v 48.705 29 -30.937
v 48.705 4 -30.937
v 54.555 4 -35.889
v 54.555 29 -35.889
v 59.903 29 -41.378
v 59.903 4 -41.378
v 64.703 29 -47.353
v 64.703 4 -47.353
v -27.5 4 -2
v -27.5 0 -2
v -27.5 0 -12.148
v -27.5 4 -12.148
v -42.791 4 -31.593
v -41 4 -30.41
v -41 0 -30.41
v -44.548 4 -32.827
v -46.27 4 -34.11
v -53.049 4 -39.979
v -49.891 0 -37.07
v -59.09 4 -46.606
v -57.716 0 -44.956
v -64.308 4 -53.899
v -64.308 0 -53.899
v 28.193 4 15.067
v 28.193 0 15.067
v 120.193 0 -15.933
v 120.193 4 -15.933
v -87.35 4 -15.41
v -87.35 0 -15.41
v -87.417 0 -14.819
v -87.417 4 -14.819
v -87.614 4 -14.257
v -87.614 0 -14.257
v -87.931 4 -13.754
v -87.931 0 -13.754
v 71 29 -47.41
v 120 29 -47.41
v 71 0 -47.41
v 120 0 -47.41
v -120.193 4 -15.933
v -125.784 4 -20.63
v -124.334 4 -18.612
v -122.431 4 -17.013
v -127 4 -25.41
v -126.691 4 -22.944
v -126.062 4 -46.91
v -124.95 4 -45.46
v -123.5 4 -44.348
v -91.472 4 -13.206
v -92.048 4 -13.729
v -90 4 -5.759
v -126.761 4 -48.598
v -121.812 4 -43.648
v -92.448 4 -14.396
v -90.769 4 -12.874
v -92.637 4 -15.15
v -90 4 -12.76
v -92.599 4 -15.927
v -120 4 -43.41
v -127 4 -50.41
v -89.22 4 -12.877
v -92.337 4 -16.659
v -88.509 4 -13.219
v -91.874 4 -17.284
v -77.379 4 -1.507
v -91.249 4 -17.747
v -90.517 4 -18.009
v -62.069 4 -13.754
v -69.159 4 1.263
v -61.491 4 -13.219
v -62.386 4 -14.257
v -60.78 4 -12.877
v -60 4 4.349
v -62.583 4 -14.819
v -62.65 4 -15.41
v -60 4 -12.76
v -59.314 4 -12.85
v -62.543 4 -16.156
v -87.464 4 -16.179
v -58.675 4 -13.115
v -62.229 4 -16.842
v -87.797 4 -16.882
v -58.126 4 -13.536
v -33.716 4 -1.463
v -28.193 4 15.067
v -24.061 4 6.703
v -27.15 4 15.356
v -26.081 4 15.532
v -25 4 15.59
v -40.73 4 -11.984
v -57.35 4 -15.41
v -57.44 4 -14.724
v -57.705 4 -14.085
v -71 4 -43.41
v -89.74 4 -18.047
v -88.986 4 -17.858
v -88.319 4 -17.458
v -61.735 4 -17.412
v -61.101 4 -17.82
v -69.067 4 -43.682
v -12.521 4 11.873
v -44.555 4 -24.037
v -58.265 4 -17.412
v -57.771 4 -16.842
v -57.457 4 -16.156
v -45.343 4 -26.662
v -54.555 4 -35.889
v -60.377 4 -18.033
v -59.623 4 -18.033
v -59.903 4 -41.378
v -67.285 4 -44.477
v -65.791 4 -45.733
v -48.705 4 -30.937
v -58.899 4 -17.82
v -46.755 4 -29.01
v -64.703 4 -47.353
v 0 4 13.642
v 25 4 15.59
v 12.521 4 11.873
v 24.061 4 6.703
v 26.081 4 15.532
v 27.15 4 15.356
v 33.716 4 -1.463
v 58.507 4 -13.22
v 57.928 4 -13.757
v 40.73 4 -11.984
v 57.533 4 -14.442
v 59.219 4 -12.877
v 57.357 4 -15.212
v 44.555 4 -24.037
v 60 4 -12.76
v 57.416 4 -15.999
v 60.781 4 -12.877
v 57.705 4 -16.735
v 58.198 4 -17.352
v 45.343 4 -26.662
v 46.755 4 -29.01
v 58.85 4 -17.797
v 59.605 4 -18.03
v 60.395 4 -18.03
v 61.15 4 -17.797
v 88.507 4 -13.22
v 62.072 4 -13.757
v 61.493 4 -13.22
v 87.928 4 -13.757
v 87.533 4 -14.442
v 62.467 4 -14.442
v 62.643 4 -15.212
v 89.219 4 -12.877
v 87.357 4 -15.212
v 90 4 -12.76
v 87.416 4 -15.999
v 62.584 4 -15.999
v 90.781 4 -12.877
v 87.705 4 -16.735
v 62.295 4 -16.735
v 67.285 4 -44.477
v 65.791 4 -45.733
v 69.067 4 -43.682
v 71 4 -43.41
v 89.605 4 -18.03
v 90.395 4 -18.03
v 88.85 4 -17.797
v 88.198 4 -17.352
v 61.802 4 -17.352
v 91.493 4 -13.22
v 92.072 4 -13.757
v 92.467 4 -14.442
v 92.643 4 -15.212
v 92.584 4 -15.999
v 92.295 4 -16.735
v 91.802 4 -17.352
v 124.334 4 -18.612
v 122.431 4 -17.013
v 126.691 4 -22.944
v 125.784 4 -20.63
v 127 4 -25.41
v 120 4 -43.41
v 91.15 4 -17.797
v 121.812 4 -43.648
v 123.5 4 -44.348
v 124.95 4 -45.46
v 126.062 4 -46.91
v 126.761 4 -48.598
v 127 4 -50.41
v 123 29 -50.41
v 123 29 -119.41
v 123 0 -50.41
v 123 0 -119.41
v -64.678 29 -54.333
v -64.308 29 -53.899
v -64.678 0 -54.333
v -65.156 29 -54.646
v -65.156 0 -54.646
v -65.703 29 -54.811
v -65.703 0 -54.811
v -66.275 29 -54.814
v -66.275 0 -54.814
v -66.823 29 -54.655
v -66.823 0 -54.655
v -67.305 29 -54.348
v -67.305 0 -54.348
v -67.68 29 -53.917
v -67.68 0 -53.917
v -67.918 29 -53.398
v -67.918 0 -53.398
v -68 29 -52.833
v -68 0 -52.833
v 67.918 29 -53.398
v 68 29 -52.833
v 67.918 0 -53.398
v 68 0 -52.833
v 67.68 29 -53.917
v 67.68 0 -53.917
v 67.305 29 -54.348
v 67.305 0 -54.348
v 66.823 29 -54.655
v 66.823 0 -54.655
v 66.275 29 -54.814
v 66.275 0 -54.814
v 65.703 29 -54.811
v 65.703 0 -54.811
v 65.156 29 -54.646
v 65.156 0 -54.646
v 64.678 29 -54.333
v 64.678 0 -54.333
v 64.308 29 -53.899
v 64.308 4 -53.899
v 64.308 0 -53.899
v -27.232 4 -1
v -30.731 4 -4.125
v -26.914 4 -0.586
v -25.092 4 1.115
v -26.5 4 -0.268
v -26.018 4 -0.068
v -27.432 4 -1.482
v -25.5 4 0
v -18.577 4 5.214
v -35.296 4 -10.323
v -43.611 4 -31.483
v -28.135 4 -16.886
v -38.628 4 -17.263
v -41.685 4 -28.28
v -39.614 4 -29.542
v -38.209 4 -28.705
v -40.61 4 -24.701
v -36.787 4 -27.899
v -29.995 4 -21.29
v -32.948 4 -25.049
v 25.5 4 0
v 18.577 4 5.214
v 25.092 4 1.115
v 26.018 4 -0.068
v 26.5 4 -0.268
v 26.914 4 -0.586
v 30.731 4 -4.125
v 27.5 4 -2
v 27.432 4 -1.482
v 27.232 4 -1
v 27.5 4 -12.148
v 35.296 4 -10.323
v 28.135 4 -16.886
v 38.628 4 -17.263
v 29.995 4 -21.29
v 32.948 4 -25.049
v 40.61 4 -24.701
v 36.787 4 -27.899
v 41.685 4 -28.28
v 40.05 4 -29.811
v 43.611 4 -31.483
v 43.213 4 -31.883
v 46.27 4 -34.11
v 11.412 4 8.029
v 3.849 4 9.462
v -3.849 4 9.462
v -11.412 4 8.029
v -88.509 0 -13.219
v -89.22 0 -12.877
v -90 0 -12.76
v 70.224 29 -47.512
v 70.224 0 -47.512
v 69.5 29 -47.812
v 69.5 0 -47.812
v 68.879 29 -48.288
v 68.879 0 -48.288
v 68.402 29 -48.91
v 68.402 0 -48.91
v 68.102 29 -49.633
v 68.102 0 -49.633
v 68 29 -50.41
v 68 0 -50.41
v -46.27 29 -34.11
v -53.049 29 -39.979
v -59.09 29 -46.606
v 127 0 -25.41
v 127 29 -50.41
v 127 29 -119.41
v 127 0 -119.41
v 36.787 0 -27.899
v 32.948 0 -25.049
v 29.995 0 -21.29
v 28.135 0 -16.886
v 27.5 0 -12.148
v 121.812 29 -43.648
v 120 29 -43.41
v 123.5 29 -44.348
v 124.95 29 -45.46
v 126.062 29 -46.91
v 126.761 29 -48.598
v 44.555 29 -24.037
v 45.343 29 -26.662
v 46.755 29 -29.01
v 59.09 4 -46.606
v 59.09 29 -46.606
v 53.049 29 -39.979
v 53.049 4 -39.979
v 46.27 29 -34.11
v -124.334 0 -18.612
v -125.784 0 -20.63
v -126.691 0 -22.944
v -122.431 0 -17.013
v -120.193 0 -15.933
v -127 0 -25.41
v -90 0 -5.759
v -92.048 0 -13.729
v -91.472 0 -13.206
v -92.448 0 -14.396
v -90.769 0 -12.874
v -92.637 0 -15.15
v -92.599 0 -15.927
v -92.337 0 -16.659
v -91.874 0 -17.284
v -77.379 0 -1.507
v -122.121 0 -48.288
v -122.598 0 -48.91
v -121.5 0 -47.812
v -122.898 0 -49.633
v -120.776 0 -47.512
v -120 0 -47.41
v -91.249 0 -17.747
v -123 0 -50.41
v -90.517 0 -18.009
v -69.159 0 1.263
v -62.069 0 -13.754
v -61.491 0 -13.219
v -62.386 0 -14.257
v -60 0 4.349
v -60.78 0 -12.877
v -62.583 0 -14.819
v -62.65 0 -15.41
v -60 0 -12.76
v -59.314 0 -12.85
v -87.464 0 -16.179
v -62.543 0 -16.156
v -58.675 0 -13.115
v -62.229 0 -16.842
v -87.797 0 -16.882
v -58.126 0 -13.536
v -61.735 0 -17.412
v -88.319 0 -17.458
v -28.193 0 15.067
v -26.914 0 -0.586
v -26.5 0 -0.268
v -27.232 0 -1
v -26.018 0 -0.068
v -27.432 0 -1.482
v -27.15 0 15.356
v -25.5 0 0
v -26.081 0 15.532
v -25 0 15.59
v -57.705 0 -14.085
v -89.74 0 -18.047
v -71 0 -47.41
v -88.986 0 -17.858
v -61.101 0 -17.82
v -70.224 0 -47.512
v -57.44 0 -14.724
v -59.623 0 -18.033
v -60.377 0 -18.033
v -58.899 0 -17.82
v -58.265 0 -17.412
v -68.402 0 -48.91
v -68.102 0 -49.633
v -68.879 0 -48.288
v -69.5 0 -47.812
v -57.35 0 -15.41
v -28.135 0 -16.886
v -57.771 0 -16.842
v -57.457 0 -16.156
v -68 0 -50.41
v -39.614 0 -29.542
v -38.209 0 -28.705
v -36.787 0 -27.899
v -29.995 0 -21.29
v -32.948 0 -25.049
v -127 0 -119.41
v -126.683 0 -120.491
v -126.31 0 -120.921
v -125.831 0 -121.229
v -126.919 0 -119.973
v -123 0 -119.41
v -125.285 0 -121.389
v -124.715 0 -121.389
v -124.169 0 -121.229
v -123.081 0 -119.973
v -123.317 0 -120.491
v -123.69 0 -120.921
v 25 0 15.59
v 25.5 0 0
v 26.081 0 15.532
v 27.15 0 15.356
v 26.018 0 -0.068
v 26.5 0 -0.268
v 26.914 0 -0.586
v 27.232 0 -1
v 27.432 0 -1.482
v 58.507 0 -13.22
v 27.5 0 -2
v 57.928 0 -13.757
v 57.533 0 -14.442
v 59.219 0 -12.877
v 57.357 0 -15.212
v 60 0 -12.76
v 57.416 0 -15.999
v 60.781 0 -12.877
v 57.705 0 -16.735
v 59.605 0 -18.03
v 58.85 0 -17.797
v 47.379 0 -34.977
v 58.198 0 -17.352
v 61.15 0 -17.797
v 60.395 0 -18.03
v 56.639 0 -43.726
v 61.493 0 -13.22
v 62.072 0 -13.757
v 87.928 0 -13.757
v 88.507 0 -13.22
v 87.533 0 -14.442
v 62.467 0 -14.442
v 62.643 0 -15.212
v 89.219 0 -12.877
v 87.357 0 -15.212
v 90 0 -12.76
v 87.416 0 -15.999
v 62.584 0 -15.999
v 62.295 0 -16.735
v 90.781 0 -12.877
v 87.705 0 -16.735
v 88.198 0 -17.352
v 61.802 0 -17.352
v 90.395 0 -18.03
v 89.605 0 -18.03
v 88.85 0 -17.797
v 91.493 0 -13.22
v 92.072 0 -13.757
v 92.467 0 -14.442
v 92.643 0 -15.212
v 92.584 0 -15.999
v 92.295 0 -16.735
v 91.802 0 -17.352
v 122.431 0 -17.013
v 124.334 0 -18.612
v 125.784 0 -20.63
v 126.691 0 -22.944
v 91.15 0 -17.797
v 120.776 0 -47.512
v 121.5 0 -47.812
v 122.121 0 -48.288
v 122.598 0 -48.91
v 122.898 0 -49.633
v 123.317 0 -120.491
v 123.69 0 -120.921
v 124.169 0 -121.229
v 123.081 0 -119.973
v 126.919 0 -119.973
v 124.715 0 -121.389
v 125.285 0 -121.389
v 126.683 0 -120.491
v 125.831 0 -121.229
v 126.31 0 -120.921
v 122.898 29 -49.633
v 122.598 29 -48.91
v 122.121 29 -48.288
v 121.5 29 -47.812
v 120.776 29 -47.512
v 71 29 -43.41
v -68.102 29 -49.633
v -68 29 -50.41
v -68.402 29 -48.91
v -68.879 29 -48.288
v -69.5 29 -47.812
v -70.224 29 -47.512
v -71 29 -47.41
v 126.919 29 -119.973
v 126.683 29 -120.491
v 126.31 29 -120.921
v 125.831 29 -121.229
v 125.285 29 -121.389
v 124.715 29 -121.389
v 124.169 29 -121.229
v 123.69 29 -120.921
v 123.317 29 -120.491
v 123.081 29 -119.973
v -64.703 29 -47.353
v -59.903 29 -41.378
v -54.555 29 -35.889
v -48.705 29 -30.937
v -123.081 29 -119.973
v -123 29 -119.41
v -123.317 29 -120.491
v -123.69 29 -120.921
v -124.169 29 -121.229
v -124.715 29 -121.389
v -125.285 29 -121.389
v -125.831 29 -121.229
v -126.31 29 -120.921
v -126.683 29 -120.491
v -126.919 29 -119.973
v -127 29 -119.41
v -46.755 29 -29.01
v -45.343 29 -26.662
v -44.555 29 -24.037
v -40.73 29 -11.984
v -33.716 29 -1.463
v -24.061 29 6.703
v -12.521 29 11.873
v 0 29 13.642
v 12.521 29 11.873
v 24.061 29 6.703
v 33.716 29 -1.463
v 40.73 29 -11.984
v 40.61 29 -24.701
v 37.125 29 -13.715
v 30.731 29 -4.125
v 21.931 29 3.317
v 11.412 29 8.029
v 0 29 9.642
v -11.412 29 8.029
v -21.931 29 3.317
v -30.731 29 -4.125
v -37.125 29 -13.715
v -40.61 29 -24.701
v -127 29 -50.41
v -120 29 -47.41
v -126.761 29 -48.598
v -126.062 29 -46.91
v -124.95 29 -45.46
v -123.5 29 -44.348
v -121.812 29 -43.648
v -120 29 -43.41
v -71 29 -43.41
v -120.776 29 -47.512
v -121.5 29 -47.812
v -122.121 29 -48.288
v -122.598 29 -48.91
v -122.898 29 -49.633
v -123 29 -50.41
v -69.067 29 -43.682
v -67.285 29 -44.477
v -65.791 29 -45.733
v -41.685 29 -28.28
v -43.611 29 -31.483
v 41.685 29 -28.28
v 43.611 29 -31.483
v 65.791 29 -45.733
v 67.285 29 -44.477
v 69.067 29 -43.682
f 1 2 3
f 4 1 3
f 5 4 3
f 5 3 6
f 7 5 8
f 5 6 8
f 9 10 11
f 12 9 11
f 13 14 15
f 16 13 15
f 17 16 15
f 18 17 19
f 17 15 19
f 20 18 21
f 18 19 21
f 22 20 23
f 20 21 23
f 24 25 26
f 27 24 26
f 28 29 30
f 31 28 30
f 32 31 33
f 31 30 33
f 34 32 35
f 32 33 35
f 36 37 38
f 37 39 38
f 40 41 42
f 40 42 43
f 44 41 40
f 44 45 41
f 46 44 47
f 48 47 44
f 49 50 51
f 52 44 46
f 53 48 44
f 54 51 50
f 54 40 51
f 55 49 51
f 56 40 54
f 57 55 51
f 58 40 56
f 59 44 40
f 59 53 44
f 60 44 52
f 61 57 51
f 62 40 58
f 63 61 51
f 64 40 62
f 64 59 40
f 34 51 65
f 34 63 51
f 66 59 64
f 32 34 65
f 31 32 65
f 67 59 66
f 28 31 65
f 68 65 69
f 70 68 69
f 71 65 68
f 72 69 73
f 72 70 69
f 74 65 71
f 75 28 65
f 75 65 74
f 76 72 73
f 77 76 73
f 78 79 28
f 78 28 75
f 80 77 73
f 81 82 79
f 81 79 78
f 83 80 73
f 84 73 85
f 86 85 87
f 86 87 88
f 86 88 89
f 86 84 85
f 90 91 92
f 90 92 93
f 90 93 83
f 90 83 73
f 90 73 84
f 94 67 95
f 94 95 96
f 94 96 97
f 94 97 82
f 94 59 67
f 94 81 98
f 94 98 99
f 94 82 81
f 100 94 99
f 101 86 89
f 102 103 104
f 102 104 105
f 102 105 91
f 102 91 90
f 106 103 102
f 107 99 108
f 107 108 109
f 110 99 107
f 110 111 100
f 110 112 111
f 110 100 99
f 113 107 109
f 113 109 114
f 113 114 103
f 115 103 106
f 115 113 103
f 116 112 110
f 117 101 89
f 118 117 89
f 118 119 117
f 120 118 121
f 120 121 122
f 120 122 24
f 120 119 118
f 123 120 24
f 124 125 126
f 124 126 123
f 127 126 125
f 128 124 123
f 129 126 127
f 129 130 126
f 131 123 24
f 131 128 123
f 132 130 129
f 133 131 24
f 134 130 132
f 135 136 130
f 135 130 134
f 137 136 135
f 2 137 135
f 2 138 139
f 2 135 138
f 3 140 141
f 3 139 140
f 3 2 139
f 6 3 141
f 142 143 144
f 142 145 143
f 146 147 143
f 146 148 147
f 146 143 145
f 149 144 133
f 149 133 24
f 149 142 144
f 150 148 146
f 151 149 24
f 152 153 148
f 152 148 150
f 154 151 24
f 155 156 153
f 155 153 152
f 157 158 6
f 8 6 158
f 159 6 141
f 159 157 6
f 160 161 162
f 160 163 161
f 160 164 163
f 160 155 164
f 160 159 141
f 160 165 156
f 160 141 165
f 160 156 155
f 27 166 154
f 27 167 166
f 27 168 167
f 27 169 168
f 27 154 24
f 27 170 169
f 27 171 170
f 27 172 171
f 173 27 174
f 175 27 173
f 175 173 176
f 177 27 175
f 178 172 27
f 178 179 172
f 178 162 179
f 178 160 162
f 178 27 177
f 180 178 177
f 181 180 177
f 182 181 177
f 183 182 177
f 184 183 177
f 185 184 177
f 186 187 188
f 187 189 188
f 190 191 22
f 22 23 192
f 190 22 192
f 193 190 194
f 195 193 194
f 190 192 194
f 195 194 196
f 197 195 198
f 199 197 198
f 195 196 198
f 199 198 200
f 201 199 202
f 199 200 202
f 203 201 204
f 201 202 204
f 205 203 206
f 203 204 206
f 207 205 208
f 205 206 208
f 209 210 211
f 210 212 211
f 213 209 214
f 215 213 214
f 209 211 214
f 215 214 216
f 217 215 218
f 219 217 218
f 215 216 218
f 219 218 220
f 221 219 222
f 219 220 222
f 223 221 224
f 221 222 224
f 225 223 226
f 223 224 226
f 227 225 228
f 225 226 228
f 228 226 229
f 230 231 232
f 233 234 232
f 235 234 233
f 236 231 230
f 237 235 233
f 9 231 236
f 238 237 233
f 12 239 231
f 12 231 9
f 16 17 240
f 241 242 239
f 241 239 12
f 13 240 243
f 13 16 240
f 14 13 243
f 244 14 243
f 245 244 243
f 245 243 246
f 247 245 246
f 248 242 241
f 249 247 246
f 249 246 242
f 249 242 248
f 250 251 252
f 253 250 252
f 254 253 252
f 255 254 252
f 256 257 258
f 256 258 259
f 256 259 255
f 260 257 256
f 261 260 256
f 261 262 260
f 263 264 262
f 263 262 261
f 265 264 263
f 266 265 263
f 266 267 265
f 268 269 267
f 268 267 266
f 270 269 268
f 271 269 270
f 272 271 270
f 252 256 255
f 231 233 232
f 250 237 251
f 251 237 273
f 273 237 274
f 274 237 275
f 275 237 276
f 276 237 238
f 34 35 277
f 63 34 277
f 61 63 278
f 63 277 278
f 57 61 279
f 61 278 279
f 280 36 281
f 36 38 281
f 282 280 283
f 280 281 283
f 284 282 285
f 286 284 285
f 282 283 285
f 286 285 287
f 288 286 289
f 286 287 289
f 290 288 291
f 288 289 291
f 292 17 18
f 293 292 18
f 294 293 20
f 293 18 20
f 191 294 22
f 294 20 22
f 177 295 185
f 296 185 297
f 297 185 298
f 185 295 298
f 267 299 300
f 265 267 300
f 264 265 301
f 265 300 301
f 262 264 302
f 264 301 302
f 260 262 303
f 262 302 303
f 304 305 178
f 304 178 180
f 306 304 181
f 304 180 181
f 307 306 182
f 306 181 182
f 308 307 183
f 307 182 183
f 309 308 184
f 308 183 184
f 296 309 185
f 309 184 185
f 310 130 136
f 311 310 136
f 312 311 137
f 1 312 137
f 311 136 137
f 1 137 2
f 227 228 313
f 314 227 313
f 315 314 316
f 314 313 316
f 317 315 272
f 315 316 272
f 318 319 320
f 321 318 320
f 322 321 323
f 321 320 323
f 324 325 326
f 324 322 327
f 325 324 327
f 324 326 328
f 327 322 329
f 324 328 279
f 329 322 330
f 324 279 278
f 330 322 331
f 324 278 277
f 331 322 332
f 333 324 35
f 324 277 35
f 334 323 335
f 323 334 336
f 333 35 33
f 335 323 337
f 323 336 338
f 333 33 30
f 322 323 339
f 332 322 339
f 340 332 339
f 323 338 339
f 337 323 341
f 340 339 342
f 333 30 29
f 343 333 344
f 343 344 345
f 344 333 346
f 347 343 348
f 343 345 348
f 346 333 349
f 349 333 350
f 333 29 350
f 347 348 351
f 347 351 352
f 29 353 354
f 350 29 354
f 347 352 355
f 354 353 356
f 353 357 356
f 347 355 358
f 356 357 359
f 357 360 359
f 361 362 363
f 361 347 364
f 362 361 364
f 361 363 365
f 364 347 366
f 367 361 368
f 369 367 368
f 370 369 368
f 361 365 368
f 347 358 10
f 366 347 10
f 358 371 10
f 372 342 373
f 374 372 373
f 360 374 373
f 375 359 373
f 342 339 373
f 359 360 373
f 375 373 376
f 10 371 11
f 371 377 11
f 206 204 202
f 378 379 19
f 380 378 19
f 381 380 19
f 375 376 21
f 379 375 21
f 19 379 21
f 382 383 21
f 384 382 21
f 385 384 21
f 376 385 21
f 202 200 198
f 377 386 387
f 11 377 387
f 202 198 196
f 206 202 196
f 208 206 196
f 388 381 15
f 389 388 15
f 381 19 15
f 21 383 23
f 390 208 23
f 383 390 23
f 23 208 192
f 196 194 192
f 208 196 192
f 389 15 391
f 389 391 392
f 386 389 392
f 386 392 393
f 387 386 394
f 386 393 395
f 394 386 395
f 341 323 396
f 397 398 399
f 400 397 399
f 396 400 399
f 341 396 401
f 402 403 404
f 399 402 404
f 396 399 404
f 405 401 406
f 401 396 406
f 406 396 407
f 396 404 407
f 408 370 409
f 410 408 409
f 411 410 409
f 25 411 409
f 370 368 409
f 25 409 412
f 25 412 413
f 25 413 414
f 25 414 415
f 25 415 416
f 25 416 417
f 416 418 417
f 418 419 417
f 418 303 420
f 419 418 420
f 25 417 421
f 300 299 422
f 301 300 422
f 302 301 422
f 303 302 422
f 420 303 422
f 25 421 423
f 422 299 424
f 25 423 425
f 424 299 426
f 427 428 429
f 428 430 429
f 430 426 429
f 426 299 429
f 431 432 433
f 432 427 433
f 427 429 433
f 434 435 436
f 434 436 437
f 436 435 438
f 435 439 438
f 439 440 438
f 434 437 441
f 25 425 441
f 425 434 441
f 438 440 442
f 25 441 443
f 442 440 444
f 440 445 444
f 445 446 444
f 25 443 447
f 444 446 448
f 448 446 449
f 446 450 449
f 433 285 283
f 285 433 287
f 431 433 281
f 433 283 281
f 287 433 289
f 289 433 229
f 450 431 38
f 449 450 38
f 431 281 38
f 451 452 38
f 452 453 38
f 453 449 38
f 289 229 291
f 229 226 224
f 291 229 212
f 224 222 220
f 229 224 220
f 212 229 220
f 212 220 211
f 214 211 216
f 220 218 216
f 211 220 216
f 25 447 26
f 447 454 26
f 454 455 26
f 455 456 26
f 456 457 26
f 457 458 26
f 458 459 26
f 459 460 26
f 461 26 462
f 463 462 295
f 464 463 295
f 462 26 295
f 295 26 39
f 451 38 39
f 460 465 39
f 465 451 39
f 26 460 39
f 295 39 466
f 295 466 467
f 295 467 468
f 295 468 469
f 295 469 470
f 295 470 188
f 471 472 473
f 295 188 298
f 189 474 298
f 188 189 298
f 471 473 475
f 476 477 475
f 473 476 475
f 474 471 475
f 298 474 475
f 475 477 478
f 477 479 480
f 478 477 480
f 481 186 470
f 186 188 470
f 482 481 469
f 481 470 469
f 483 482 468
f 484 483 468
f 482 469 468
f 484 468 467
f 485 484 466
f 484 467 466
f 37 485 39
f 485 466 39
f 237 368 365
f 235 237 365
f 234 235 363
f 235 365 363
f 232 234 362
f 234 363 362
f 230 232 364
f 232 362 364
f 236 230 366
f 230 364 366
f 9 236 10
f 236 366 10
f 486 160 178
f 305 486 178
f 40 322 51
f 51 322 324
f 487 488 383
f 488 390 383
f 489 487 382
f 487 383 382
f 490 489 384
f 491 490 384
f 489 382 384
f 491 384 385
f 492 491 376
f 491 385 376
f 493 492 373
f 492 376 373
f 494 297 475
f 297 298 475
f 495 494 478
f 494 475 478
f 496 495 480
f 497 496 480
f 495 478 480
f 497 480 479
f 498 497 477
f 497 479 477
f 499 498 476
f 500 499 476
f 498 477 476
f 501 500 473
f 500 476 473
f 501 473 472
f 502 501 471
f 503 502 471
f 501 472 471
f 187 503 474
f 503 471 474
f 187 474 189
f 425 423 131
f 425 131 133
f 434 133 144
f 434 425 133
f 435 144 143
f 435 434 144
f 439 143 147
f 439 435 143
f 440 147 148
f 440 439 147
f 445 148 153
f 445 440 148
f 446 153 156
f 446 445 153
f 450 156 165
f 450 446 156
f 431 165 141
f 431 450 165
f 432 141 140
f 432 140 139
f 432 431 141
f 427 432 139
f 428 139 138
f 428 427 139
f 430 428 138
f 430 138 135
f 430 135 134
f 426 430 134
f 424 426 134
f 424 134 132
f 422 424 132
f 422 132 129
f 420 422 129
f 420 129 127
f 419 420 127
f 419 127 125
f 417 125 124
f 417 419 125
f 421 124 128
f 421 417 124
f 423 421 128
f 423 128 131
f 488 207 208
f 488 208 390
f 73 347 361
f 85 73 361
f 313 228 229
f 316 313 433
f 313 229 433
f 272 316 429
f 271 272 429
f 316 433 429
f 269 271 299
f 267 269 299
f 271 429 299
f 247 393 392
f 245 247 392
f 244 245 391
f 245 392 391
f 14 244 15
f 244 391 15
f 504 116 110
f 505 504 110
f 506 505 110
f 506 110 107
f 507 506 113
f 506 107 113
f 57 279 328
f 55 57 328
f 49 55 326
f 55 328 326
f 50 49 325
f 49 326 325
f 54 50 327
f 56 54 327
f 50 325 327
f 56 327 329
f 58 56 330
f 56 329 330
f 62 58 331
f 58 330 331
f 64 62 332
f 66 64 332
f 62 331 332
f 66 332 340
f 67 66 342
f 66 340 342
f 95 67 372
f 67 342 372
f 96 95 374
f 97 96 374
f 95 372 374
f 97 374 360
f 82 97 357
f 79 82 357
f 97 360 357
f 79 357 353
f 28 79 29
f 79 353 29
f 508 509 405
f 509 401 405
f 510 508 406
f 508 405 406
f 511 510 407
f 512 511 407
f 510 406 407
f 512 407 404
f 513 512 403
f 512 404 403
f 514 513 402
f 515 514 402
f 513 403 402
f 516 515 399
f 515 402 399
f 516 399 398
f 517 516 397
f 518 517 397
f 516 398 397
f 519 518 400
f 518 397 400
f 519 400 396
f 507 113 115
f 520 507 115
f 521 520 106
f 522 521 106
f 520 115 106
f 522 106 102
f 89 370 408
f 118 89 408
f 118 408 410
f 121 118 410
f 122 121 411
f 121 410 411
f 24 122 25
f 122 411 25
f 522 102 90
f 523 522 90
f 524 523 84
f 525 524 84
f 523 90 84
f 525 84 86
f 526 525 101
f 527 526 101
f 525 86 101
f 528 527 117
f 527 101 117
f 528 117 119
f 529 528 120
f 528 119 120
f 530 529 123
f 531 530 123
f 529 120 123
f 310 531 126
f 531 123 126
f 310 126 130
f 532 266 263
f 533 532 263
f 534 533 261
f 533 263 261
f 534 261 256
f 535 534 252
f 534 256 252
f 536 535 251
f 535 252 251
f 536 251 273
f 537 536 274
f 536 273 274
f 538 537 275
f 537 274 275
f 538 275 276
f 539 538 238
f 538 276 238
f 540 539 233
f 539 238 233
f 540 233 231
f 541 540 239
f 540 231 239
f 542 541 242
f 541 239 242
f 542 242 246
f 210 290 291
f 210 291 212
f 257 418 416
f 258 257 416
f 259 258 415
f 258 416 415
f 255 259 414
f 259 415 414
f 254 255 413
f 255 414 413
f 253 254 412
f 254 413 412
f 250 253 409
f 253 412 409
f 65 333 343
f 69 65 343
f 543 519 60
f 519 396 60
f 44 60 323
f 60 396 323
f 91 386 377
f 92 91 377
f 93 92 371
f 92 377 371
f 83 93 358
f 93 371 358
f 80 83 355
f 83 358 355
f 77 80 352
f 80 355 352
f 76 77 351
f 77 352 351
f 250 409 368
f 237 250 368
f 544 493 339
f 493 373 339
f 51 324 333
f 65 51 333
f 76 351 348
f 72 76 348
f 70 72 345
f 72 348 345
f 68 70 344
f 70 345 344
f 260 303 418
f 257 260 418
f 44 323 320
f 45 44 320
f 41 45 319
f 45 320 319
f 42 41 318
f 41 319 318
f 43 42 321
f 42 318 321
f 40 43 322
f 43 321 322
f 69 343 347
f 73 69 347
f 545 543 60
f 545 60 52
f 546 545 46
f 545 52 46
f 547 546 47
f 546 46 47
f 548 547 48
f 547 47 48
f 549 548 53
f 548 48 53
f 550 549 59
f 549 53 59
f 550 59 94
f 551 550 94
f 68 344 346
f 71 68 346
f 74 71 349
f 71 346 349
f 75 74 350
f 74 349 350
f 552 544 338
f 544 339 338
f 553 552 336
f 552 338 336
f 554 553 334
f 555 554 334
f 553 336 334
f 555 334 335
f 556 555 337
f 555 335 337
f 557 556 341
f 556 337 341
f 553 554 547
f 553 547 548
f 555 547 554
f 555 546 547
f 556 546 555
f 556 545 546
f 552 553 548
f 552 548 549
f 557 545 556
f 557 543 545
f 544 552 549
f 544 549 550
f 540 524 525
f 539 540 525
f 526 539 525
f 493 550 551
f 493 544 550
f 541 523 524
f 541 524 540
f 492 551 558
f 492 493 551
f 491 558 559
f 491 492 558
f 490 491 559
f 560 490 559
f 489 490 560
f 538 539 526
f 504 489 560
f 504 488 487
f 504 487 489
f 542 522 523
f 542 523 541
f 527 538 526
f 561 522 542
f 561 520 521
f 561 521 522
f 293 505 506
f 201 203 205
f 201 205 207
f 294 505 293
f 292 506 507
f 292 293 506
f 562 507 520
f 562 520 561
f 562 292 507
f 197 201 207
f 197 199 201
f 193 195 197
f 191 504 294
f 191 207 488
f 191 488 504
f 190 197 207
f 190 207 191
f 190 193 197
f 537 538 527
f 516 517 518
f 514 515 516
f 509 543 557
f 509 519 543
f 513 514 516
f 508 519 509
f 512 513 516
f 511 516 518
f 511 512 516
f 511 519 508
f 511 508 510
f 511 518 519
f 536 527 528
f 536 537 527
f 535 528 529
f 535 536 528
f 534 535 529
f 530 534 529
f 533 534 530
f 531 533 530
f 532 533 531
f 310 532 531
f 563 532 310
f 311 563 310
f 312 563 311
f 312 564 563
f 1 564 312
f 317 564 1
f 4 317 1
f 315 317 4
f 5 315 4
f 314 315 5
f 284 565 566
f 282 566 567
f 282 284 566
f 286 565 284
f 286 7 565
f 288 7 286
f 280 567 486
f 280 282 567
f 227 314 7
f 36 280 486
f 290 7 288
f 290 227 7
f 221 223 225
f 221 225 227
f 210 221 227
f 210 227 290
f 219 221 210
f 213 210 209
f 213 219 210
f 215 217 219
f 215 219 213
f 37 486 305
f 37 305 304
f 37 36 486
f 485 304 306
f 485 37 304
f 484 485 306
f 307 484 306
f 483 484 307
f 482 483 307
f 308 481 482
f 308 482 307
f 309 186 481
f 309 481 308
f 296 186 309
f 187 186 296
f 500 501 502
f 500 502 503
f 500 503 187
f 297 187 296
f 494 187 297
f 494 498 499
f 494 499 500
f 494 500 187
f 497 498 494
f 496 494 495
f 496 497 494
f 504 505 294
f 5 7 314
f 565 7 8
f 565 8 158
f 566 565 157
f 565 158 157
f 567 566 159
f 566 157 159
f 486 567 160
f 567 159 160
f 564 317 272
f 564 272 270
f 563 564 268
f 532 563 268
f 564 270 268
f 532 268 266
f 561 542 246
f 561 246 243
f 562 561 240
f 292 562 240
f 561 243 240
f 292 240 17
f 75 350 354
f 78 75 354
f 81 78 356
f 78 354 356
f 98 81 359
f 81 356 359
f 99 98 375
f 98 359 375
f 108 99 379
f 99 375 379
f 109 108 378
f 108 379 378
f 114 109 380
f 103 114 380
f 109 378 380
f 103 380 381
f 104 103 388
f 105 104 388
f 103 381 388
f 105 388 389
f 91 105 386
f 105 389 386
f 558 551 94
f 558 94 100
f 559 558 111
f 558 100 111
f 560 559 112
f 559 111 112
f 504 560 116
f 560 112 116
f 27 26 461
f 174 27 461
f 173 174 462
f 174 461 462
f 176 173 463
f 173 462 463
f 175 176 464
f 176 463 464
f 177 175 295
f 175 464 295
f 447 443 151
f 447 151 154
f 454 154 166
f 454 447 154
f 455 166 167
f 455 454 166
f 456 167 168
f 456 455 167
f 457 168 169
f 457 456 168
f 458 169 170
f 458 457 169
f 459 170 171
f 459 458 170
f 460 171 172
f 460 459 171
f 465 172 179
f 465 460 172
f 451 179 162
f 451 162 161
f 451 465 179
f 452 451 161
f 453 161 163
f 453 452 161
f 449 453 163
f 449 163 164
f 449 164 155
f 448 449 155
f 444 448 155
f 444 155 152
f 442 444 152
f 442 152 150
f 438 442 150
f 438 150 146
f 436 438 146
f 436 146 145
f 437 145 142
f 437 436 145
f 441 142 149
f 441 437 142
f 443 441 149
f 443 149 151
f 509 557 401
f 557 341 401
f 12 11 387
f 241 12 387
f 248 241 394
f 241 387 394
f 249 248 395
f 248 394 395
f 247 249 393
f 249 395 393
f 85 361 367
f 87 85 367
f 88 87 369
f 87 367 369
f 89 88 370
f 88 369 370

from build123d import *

# Parameters (mm, degrees)
SKETCH_2_R      = 2.65
EXTRUDE_1_DEPTH = 4
EXTRUDE_2_DEPTH = 25


with BuildPart() as part:
    # 草图2 → 凸台-拉伸1 (new body)
    # profile 1 of 5: a face of its own
    with BuildSketch(Plane(origin=(0, 0, 0), x_dir=(1, 0, 0), z_dir=(0, 1, 0))):
        with BuildLine():
            Line((-27.5, 2), (-27.5, 12.147710197))
            ThreePointArc((-27.5, 12.147710197), (-29.994681763, 21.290199266), (-36.787234043, 27.898510474))
            ThreePointArc((-36.787234043, 27.898510474), (-38.913878838, 29.12011529), (-41, 30.409702399))
            ThreePointArc((-41, 30.409702399), (-53.947743005, 40.870206984), (-64.307692308, 53.898547461))
            ThreePointArc((-64.307692308, 53.898547461), (-66.554700196, 54.754207886), (-68, 52.832670041))
            Line((-68, 52.832670041), (-68, 50.409702399))
            ThreePointArc((-68, 50.409702399), (-68.878679656, 48.288382056), (-71, 47.409702399))
            Line((-71, 47.409702399), (-120, 47.409702399))
            ThreePointArc((-120, 47.409702399), (-122.121320344, 48.288382056), (-123, 50.409702399))
            Line((-123, 50.409702399), (-123, 119.409702399))
            ThreePointArc((-123, 119.409702399), (-125, 121.409702399), (-127, 119.409702399))
            Line((-127, 119.409702399), (-127, 25.409702399))
            ThreePointArc((-127, 25.409702399), (-125.121934023, 19.575819668), (-120.193162456, 15.933220271))
            Line((-120.193162456, 15.933220271), (-90, 5.759437269))
            Line((-90, 5.759437269), (-90, 12.759702399))
            ThreePointArc((-90, 12.759702399), (-91.87383297, 17.283535369), (-87.35, 15.409702399))
            Line((-87.35, 15.409702399), (-62.65, 15.409702399))
            ThreePointArc((-62.65, 15.409702399), (-60, 18.059702399), (-57.35, 15.409702399))
            ThreePointArc((-57.35, 15.409702399), (-58.12616703, 13.535869429), (-60, 12.759702399))
            Line((-60, 12.759702399), (-60, -4.349258383))
            Line((-60, -4.349258383), (-28.193162456, -15.066779729))
            ThreePointArc((-28.193162456, -15.066779729), (-26.617896585, -15.458550265), (-25, -15.590297601))
            Line((-25, -15.590297601), (25, -15.590297601))
            ThreePointArc((25, -15.590297601), (26.617896585, -15.458550265), (28.193162456, -15.066779729))
            Line((28.193162456, -15.066779729), (120.193162456, 15.933220271))
            ThreePointArc((120.193162456, 15.933220271), (125.121934023, 19.575819668), (127, 25.409702399))
            Line((127, 25.409702399), (127, 119.409702399))
            ThreePointArc((127, 119.409702399), (125, 121.409702399), (123, 119.409702399))
            Line((123, 119.409702399), (123, 50.409702399))
            ThreePointArc((123, 50.409702399), (122.121320344, 48.288382056), (120, 47.409702399))
            Line((120, 47.409702399), (71, 47.409702399))
            ThreePointArc((71, 47.409702399), (68.878679656, 48.288382056), (68, 50.409702399))
            Line((68, 50.409702399), (68, 52.832670041))
            ThreePointArc((68, 52.832670041), (66.554700196, 54.754207886), (64.307692308, 53.898547461))
            ThreePointArc((64.307692308, 53.898547461), (52.192399009, 39.157401138), (36.787234043, 27.898510474))
            ThreePointArc((36.787234043, 27.898510474), (29.994681763, 21.290199266), (27.5, 12.147710197))
            Line((27.5, 12.147710197), (27.5, 2))
            ThreePointArc((27.5, 2), (26.914213562, 0.585786438), (25.5, 0))
            Line((25.5, 0), (-25.5, 0))
            ThreePointArc((-25.5, 0), (-26.914213562, 0.585786438), (-27.5, 2))
        make_face()
        with Locations(Location((60, 15.409702399, 0), (0, 0, 270))):
            Circle(SKETCH_2_R, mode=Mode.SUBTRACT)
        with Locations(Location((90, 15.409702399, 0), (0, 0, 270))):
            Circle(SKETCH_2_R, mode=Mode.SUBTRACT)
    # profile 2 of 5: a face of its own
    with BuildSketch(Plane(origin=(0, 0, 0), x_dir=(1, 0, 0), z_dir=(0, 1, 0))):
        with BuildLine():
            Line((-90, 12.759702399), (-90, 5.759437269))
            Line((-90, 5.759437269), (-77.378818279, 1.506647776))
            Line((-77.378818279, 1.506647776), (-75, 3.409702399))
            Line((-75, 3.409702399), (-87.930697655, 13.754260523))
            ThreePointArc((-87.930697655, 13.754260523), (-88.852049864, 13.021248823), (-90, 12.759702399))
        make_face()
    # profile 3 of 5: a face of its own
    with BuildSketch(Plane(origin=(0, 0, 0), x_dir=(1, 0, 0), z_dir=(0, 1, 0))):
        with BuildLine():
            Line((-87.930697655, 13.754260523), (-75, 3.409702399))
            Line((-75, 3.409702399), (-62.069302345, 13.754260523))
            ThreePointArc((-62.069302345, 13.754260523), (-62.500615046, 14.532534004), (-62.65, 15.409702399))
            Line((-62.65, 15.409702399), (-87.35, 15.409702399))
            ThreePointArc((-87.35, 15.409702399), (-87.499384954, 14.532534004), (-87.930697655, 13.754260523))
        make_face()
    # profile 4 of 5: a face of its own
    with BuildSketch(Plane(origin=(0, 0, 0), x_dir=(1, 0, 0), z_dir=(0, 1, 0))):
        with BuildLine():
            Line((-75, 3.409702399), (-69.159051832, -1.263056135))
            Line((-69.159051832, -1.263056135), (-60, -4.349258383))
            Line((-60, -4.349258383), (-60, 12.759702399))
            ThreePointArc((-60, 12.759702399), (-61.147950136, 13.021248823), (-62.069302345, 13.754260523))
            Line((-62.069302345, 13.754260523), (-75, 3.409702399))
        make_face()
    # profile 5 of 5: a face of its own
    with BuildSketch(Plane(origin=(0, 0, 0), x_dir=(1, 0, 0), z_dir=(0, 1, 0))):
        Polygon((-75, 3.409702399), (-77.378818279, 1.506647776), (-69.159051832, -1.263056135), align=None)
    extrude(amount=EXTRUDE_1_DEPTH)

    # 草图3 → 凸台-拉伸2 (add)
    with BuildSketch(Plane(origin=(0, 4, 0), x_dir=(1, 0, 0), z_dir=(0, 1, 0))):
        with BuildLine():
            Line((127, 50.409702399), (127, 115.409702399))
            Line((127, 115.409702399), (127, 119.409702399))
            ThreePointArc((127, 119.409702399), (125, 121.409702399), (123, 119.409702399))
            Line((123, 119.409702399), (123, 50.409702399))
            ThreePointArc((123, 50.409702399), (122.121320344, 48.288382056), (120, 47.409702399))
            Line((120, 47.409702399), (71, 47.409702399))
            ThreePointArc((71, 47.409702399), (68.878679656, 48.288382056), (68, 50.409702399))
            Line((68, 50.409702399), (68, 52.832670041))
            ThreePointArc((68, 52.832670041), (66.554700196, 54.754207886), (64.307692308, 53.898547461))
            ThreePointArc((64.307692308, 53.898547461), (56.167018952, 43.203588844), (46.269641343, 34.109930672))
            ThreePointArc((46.269641343, 34.109930672), (42.548019366, 29.9419633), (40.610070261, 24.701087856))
            ThreePointArc((40.610070261, 24.701087856), (0, -9.642140289), (-40.610070261, 24.701087856))
            ThreePointArc((-40.610070261, 24.701087856), (-42.548019366, 29.9419633), (-46.269641343, 34.109930672))
            ThreePointArc((-46.269641343, 34.109930672), (-56.167018952, 43.203588844), (-64.307692308, 53.898547461))
            ThreePointArc((-64.307692308, 53.898547461), (-66.554700196, 54.754207886), (-68, 52.832670041))
            Line((-68, 52.832670041), (-68, 50.409702399))
            ThreePointArc((-68, 50.409702399), (-68.878679656, 48.288382056), (-71, 47.409702399))
            Line((-71, 47.409702399), (-120, 47.409702399))
            ThreePointArc((-120, 47.409702399), (-122.121320344, 48.288382056), (-123, 50.409702399))
            Line((-123, 50.409702399), (-123, 119.409702399))
            ThreePointArc((-123, 119.409702399), (-125, 121.409702399), (-127, 119.409702399))
            Line((-127, 119.409702399), (-127, 115.409702399))
            Line((-127, 115.409702399), (-127, 50.409702399))
            ThreePointArc((-127, 50.409702399), (-124.949747468, 45.459954931), (-120, 43.409702399))
            Line((-120, 43.409702399), (-71, 43.409702399))
            ThreePointArc((-71, 43.409702399), (-67.284863149, 44.476932542), (-64.702556592, 47.353200063))
            ThreePointArc((-64.702556592, 47.353200063), (-57.294743258, 38.568992354), (-48.704885624, 30.936669685))
            ThreePointArc((-48.704885624, 30.936669685), (-45.975696175, 27.880160279), (-44.554533498, 24.03685162))
            ThreePointArc((-44.554533498, 24.03685162), (0, -13.642140289), (44.554533498, 24.03685162))
            ThreePointArc((44.554533498, 24.03685162), (45.975696175, 27.880160279), (48.704885624, 30.936669685))
            ThreePointArc((48.704885624, 30.936669685), (57.294743258, 38.568992354), (64.702556592, 47.353200063))
            ThreePointArc((64.702556592, 47.353200063), (67.284863149, 44.476932542), (71, 43.409702399))
            Line((71, 43.409702399), (120, 43.409702399))
            ThreePointArc((120, 43.409702399), (124.949747468, 45.459954931), (127, 50.409702399))
        make_face()
    extrude(amount=EXTRUDE_2_DEPTH)


solid = part.part
